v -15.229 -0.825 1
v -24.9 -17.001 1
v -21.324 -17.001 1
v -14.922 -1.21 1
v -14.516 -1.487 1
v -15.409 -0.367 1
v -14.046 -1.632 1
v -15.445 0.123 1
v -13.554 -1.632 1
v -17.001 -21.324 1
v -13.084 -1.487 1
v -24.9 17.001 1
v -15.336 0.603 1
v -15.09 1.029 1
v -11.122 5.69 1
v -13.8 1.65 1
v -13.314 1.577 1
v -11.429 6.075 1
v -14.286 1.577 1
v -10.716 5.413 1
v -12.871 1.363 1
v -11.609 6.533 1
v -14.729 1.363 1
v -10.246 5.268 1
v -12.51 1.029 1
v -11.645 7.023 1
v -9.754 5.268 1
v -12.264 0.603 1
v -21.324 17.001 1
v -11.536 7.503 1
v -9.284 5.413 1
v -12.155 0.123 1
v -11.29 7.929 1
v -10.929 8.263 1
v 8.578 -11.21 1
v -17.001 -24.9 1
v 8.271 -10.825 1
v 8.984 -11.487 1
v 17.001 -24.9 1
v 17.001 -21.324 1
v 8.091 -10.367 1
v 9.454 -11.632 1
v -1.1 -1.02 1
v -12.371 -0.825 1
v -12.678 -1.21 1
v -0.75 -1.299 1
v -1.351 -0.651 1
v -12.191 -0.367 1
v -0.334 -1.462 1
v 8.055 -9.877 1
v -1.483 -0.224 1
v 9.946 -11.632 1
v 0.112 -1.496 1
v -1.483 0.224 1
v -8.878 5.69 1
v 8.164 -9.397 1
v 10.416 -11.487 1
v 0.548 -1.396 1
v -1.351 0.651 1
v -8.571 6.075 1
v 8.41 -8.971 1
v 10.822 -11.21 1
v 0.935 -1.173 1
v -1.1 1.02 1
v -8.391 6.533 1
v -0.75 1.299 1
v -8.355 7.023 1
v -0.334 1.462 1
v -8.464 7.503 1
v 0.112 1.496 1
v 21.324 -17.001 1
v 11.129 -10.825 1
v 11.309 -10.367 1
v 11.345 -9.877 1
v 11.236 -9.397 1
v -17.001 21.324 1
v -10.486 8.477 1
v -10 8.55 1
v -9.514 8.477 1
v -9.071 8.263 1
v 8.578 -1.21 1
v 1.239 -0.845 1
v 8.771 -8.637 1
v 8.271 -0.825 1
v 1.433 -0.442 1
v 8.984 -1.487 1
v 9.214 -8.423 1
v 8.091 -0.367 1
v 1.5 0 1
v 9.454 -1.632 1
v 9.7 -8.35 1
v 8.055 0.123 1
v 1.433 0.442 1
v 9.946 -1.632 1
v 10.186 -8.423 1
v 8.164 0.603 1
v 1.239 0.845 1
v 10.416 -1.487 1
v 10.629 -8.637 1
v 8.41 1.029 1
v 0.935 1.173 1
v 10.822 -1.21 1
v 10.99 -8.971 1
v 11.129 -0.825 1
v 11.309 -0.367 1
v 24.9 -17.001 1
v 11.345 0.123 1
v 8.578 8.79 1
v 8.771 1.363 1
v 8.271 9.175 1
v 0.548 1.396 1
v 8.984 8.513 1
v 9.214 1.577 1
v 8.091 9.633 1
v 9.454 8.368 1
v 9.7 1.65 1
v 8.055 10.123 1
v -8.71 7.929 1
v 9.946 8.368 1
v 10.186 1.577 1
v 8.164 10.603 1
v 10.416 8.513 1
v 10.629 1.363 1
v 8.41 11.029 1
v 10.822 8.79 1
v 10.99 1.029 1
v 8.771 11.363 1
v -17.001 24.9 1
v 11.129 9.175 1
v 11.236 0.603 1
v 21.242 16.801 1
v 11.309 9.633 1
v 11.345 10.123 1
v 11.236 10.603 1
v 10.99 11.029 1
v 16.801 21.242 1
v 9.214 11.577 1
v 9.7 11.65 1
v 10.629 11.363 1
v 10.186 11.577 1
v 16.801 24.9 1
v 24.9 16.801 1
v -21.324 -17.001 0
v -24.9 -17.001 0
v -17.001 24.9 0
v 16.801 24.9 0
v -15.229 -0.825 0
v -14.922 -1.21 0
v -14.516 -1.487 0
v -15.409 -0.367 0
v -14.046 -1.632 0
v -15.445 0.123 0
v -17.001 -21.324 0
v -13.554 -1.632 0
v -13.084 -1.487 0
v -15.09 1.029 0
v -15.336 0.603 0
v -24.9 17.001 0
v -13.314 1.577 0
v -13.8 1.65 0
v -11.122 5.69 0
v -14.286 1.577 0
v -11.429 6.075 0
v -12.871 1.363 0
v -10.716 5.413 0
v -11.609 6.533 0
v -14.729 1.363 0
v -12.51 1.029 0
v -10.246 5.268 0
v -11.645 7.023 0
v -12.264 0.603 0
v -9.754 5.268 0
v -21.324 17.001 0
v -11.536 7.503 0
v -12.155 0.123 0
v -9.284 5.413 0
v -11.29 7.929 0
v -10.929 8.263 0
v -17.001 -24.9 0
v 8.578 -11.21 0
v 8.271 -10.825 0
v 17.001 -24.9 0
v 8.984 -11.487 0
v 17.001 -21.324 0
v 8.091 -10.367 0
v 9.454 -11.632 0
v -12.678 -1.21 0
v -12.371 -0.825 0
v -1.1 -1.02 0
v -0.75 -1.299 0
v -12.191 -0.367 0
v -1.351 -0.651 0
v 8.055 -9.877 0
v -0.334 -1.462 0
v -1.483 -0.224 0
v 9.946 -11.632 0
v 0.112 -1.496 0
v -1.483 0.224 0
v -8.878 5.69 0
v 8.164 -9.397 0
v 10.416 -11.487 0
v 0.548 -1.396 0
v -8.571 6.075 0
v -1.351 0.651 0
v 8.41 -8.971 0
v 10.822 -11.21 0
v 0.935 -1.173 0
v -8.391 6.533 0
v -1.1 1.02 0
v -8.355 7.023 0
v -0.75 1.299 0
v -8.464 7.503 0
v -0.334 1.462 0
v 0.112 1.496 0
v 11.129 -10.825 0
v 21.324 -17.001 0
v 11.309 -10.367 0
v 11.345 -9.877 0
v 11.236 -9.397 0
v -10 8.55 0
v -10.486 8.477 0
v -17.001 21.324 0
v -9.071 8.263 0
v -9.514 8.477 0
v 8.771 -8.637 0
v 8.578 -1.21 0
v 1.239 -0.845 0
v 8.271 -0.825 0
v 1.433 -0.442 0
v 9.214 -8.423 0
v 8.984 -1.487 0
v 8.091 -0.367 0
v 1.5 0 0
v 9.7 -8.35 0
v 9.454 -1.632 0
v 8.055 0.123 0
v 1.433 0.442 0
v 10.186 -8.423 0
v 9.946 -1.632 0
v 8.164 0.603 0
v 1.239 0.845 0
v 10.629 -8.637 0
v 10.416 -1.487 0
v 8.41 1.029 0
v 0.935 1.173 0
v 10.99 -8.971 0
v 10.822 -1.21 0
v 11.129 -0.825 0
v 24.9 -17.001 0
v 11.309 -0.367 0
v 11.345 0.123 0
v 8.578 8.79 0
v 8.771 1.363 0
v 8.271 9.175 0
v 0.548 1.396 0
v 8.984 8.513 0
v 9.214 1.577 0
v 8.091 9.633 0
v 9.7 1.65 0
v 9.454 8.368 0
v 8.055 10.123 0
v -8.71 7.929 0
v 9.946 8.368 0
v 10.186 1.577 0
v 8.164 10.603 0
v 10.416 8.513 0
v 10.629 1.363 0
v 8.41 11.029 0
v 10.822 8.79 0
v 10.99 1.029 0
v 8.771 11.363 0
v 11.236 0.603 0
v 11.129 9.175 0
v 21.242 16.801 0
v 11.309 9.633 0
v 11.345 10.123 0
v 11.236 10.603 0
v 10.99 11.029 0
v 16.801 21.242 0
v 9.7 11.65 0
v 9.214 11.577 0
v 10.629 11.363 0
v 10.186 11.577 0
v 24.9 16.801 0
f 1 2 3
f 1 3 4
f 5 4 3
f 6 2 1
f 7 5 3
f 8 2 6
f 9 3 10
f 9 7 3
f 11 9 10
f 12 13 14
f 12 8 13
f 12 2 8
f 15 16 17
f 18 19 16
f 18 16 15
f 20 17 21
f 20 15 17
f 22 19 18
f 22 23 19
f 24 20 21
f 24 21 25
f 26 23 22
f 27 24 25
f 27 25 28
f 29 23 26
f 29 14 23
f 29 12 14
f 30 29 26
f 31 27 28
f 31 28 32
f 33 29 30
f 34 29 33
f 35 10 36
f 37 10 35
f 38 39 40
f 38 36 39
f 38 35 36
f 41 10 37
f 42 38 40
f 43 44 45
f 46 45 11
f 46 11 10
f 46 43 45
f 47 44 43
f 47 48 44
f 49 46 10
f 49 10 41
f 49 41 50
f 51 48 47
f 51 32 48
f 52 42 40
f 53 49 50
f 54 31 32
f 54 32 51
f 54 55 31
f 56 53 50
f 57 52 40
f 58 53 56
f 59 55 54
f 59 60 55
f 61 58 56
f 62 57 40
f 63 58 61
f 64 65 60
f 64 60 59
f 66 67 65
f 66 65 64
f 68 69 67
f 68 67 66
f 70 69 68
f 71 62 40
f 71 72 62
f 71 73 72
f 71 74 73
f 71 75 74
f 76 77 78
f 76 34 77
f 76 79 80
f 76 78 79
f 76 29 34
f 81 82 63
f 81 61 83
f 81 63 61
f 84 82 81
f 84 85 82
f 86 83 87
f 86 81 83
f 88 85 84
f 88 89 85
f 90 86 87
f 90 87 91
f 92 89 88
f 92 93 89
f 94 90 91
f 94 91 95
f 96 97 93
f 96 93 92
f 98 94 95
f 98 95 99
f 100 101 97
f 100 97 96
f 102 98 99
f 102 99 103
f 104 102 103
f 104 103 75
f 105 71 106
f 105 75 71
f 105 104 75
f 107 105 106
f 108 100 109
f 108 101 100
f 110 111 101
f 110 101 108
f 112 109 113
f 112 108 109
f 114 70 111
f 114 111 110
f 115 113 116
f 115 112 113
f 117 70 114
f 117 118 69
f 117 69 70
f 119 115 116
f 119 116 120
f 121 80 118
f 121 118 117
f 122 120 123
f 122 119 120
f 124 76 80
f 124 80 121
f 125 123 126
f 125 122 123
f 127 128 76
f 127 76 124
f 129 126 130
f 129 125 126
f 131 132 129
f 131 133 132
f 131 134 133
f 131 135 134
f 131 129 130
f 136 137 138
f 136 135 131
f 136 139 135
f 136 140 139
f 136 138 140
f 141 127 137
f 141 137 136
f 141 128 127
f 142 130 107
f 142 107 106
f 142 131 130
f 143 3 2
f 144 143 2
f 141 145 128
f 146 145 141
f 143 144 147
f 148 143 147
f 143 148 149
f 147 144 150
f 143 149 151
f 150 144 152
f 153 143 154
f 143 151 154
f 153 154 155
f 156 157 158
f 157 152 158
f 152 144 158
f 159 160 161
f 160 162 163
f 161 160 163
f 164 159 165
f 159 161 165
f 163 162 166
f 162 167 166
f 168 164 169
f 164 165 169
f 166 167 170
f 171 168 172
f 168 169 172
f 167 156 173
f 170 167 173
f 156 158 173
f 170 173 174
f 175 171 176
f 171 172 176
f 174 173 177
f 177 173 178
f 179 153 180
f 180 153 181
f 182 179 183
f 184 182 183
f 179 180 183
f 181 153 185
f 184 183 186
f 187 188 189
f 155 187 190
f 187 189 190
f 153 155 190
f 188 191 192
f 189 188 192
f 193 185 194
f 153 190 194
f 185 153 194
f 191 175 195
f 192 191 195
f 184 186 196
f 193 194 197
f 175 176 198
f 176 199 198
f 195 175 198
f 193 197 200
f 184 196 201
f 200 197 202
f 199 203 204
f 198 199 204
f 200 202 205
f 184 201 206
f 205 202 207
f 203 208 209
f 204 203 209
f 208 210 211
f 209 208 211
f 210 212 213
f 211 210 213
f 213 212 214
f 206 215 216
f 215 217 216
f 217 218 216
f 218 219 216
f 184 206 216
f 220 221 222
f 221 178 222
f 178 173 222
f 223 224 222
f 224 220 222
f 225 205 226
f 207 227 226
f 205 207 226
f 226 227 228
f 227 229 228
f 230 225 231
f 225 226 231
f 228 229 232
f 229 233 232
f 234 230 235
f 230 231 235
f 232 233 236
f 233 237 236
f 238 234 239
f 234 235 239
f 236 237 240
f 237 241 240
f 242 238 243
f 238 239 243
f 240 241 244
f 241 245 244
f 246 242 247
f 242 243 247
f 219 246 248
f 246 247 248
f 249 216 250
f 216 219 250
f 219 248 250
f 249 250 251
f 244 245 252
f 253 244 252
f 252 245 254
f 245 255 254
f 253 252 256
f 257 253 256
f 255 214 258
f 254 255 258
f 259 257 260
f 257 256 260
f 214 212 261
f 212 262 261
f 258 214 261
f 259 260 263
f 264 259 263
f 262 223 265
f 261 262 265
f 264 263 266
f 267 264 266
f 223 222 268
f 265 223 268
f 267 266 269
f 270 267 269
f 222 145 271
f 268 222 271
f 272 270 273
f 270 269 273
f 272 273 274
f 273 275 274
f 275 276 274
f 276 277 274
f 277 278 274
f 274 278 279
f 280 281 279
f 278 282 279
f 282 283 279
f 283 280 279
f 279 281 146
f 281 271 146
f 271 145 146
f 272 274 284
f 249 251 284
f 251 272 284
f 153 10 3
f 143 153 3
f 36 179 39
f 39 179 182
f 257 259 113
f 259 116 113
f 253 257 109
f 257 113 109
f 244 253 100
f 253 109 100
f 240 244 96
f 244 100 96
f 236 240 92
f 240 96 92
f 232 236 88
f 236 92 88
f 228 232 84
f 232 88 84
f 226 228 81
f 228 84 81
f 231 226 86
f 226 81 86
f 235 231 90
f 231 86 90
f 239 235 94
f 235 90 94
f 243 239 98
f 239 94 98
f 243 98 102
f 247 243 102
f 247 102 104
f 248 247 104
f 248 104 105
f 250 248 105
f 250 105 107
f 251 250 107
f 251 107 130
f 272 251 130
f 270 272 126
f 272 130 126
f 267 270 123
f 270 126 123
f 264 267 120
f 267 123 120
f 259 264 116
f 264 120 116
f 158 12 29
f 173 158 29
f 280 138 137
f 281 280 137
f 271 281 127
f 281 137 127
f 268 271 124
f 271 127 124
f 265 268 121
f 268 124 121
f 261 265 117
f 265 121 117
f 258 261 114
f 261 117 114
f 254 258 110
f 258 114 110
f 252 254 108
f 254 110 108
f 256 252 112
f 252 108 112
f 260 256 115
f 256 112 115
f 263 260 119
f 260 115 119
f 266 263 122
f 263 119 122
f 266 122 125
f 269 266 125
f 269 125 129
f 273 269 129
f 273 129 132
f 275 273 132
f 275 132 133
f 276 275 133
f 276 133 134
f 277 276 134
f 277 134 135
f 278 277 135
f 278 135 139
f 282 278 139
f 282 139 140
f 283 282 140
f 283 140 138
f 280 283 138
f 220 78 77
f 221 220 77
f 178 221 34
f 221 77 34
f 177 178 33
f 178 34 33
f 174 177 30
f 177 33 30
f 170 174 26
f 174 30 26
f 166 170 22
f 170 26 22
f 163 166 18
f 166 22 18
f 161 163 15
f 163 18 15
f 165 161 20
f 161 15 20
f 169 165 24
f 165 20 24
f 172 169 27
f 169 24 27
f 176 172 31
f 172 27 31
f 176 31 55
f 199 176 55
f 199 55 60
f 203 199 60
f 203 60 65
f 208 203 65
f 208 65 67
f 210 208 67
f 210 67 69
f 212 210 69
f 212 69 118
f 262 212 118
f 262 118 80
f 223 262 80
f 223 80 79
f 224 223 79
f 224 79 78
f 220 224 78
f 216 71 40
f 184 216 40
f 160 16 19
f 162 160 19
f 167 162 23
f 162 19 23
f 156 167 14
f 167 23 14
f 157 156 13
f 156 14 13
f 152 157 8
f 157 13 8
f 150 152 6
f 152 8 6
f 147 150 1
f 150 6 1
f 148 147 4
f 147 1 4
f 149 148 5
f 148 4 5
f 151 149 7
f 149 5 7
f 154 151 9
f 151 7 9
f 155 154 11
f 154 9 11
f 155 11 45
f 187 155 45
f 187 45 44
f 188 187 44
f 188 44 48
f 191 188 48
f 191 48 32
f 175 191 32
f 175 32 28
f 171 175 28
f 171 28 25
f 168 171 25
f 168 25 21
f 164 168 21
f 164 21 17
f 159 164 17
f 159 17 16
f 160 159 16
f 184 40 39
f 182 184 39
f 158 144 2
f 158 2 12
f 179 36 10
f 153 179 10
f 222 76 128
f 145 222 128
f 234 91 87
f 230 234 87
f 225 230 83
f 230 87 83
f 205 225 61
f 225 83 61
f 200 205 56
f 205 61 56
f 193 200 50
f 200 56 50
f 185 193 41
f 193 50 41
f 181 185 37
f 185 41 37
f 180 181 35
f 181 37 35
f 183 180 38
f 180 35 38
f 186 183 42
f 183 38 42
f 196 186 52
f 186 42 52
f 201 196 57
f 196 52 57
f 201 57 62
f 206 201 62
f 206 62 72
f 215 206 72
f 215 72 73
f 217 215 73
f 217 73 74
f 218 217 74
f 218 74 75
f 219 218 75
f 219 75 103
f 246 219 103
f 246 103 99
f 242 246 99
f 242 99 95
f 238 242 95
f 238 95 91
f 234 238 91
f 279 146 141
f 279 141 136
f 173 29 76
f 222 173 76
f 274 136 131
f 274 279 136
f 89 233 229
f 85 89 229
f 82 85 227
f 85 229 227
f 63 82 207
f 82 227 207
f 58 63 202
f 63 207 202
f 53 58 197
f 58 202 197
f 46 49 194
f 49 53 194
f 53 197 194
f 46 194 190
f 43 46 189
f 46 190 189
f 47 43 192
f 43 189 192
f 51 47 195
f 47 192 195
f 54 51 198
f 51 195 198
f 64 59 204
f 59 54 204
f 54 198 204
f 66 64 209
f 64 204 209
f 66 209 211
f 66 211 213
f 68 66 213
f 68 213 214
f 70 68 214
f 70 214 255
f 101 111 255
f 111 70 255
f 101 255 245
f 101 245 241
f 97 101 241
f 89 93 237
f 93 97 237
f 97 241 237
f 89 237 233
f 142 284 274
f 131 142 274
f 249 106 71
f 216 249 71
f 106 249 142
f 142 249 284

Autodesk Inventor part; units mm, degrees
ref_plane "YZ Plane" through (0, 0, 0) normal (1, 0, 0) x (0, 1, 0)
ref_plane "Work Plane1" through (-29.1, -14.5, 2.4) normal (0, 0, -1) x (0, 1, 0)
ref_plane "Work Plane2" through (-13.8999, -10.5497, 2.25) normal (0, 0, -1) x (0, 1, 0)
sketch "Sketch1" plane through (0, 0, 0) normal (0, 0, 1) x (1, 0, 0)
  line L0 (-34.86, 0) -> (34.86, 0) construction
  line L1 (0, -34.86) -> (0, 34.86) construction
  line L2 (0, 0) -> (11.1575, 11.1575) construction
  line L3 (0, 0) -> (15.7791, 0) construction
  line L4 (0, 24.9) -> (16.8009, 24.9)
  line L5 (16.8009, 24.9) -> (16.8009, 21.2415)
  line L6 (16.8009, 21.2415) -> (19.0212, 19.0212)
  line L7 (24.9, 0) -> (24.9, 16.8009)
  line L8 (24.9, 16.8009) -> (21.2415, 16.8009)
  line L9 (21.2415, 16.8009) -> (19.0212, 19.0212)
  line L10 (0, -24.9) -> (16.8009, -24.9)
  line L11 (16.8009, -24.9) -> (16.8009, -21.2415)
  line L12 (16.8009, -21.2415) -> (19.0212, -19.0212)
  line L13 (24.9, 0) -> (24.9, -16.8009)
  line L14 (24.9, -16.8009) -> (21.2415, -16.8009)
  line L15 (21.2415, -16.8009) -> (19.0212, -19.0212)
  line L16 (0, 24.9) -> (-16.8009, 24.9)
  line L17 (-16.8009, 24.9) -> (-16.8009, 21.2415)
  line L18 (-16.8009, 21.2415) -> (-19.0212, 19.0212)
  line L19 (-24.9, 16.8009) -> (-21.2415, 16.8009)
  line L20 (-21.2415, 16.8009) -> (-19.0212, 19.0212)
  line L21 (0, -24.9) -> (-16.8009, -24.9)
  line L22 (-16.8009, -24.9) -> (-16.8009, -21.2415)
  line L23 (-16.8009, -21.2415) -> (-19.0212, -19.0212)
  line L24 (-21.2415, -16.8009) -> (-19.0212, -19.0212)
  line L25 (-24.9, -16.8009) -> (-21.2415, -16.8009)
  line L26 (-24.9, 0) -> (-24.9, -16.8009)
  line L27 (-24.9, 0) -> (-24.9, 16.8009)
  circle A0 centre (0, 0) radius 1.5
  dimension "d0" = 45
  dimension "d2" = 24.9
  dimension "d3" = 3.14
  dimension "d4" = 26.9
  dimension "d5" = 3
extrude "Extrusion1" add sketch "Sketch1" along normal blind 1
sketch "Sketch5" plane through (0, 0, 0) normal (0, 0, -1) x (-1, 0, 0)
  circle A0 centre (-9.7, 10) radius 1.4
  circle A1 centre (-9.7, -10) radius 1.4
  circle A2 centre (13.8, 0) radius 1.4
  circle A3 centre (-10, 6.9) radius 0.75
  circle A4 centre (10, 6.9) radius 1.25
  circle A5 centre (-9.7, 0) radius 1.5
  point P0 (0, 0)
  dimension "d28" = 3
hole "Hole1" at (-13.8, 0, 0) at (9.7, -10, 0) at (-10, 6.9, 0) at (9.7, 10, 0) at (9.7, 0, 0) direction (0, 0, 1) diameter 3.3 depth 12 tip angle 118
sketch "Skizze6" plane through (-16.8009, 24.9, 1) normal (0, 0, 1) x (1, 0, 0)
  circle A0 centre (6.8009, -18) radius 1.65 construction
  circle A1 centre (3.0009, -24.9) radius 1.65 construction
  circle A2 centre (26.5009, -34.9) radius 1.65 construction
  circle A3 centre (26.5009, -14.9) radius 1.65 construction
  circle A4 centre (16.8009, -24.9) radius 10 construction
  line L0 (33.6017, -3.6585) -> (33.6017, 0) projected
  line L1 (33.6017, 0) -> (0, 0) construction
  line L2 (0, 0) -> (0, -3.6585) projected
  line L3 (0, -3.6585) -> (-4.4406, -8.0991) projected
  line L4 (-4.4406, -8.0991) -> (-8.0991, -8.0991) projected
  line L5 (-8.0991, -8.0991) -> (-8.0991, -41.7009) construction
  line L6 (-8.0991, -41.7009) -> (-4.4406, -41.7009) projected
  line L7 (-4.4406, -41.7009) -> (0, -46.1415) projected
  line L8 (0, -46.1415) -> (0, -49.8) projected
  line L9 (0, -49.8) -> (33.6017, -49.8) construction
  line L10 (33.6017, -49.8) -> (33.6017, -46.1415) projected
  line L11 (33.6017, -46.1415) -> (38.0423, -41.7009) projected
  line L12 (38.0423, -41.7009) -> (41.7009, -41.7009) projected
  line L13 (41.7009, -41.7009) -> (41.7009, -8.0991) construction
  line L14 (41.7009, -8.0991) -> (38.0423, -8.0991) projected
  line L15 (38.0423, -8.0991) -> (33.6017, -3.6585) projected
  line L16 (-0.2, 0.2) -> (33.8017, 0.2) construction
  line L17 (33.8017, 0.2) -> (33.8017, -3.5757)
  line L18 (33.8017, -3.5757) -> (38.1252, -7.8991)
  line L19 (38.1252, -7.8991) -> (41.9009, -7.8991)
  line L20 (41.9009, -7.8991) -> (41.9009, -41.9009) construction
  line L21 (41.9009, -41.9009) -> (38.1252, -41.9009)
  line L22 (38.1252, -41.9009) -> (33.8017, -46.2243)
  line L23 (33.8017, -46.2243) -> (33.8017, -50)
  line L24 (33.8017, -50) -> (-0.2, -50) construction
  line L25 (-0.2, -50) -> (-0.2, -46.2243)
  line L26 (-0.2, -46.2243) -> (-4.5235, -41.9009)
  line L27 (-4.5235, -41.9009) -> (-8.2991, -41.9009)
  line L28 (-8.2991, -41.9009) -> (-8.2991, -7.8991) construction
  line L29 (-8.2991, -7.8991) -> (-4.5235, -7.8991)
  line L30 (-4.5235, -7.8991) -> (-0.2, -3.5757)
  line L31 (-0.2, -3.5757) -> (-0.2, 0.2)
  line L32 (-8.0991, -8.0991) -> (-8.0991, -7.8991)
  line L33 (0, 0) -> (-0.2, 0)
  line L34 (33.6017, 0) -> (33.8017, 0)
  line L35 (41.7009, -8.0991) -> (38.0423, -8.0991) projected
  line L36 (41.7009, -8.0991) -> (41.7009, -7.8991)
  line L37 (41.7009, -41.7009) -> (41.7009, -41.9009)
  line L38 (33.6017, -49.8) -> (33.8017, -49.8)
  line L39 (-8.0991, -41.7009) -> (-8.0991, -41.9009)
  line L40 (0, -49.8) -> (-0.2, -49.8)
  point P0 (16.8009, -24.9)
  dimension "d25" = 0.2
extrude "IM_offset" add sketch "Skizze6" against normal up to surface (1 mm away) contours L2 L3 L4 L32 L29 L30 L31 L33 | L6 L7 L8 L40 L25 L26 L27 L39 | L10 L11 L12 L37 L21 L22 L23 L38
properties part number "20_Cube_insert_AlliedVision_Alvium_v3"
